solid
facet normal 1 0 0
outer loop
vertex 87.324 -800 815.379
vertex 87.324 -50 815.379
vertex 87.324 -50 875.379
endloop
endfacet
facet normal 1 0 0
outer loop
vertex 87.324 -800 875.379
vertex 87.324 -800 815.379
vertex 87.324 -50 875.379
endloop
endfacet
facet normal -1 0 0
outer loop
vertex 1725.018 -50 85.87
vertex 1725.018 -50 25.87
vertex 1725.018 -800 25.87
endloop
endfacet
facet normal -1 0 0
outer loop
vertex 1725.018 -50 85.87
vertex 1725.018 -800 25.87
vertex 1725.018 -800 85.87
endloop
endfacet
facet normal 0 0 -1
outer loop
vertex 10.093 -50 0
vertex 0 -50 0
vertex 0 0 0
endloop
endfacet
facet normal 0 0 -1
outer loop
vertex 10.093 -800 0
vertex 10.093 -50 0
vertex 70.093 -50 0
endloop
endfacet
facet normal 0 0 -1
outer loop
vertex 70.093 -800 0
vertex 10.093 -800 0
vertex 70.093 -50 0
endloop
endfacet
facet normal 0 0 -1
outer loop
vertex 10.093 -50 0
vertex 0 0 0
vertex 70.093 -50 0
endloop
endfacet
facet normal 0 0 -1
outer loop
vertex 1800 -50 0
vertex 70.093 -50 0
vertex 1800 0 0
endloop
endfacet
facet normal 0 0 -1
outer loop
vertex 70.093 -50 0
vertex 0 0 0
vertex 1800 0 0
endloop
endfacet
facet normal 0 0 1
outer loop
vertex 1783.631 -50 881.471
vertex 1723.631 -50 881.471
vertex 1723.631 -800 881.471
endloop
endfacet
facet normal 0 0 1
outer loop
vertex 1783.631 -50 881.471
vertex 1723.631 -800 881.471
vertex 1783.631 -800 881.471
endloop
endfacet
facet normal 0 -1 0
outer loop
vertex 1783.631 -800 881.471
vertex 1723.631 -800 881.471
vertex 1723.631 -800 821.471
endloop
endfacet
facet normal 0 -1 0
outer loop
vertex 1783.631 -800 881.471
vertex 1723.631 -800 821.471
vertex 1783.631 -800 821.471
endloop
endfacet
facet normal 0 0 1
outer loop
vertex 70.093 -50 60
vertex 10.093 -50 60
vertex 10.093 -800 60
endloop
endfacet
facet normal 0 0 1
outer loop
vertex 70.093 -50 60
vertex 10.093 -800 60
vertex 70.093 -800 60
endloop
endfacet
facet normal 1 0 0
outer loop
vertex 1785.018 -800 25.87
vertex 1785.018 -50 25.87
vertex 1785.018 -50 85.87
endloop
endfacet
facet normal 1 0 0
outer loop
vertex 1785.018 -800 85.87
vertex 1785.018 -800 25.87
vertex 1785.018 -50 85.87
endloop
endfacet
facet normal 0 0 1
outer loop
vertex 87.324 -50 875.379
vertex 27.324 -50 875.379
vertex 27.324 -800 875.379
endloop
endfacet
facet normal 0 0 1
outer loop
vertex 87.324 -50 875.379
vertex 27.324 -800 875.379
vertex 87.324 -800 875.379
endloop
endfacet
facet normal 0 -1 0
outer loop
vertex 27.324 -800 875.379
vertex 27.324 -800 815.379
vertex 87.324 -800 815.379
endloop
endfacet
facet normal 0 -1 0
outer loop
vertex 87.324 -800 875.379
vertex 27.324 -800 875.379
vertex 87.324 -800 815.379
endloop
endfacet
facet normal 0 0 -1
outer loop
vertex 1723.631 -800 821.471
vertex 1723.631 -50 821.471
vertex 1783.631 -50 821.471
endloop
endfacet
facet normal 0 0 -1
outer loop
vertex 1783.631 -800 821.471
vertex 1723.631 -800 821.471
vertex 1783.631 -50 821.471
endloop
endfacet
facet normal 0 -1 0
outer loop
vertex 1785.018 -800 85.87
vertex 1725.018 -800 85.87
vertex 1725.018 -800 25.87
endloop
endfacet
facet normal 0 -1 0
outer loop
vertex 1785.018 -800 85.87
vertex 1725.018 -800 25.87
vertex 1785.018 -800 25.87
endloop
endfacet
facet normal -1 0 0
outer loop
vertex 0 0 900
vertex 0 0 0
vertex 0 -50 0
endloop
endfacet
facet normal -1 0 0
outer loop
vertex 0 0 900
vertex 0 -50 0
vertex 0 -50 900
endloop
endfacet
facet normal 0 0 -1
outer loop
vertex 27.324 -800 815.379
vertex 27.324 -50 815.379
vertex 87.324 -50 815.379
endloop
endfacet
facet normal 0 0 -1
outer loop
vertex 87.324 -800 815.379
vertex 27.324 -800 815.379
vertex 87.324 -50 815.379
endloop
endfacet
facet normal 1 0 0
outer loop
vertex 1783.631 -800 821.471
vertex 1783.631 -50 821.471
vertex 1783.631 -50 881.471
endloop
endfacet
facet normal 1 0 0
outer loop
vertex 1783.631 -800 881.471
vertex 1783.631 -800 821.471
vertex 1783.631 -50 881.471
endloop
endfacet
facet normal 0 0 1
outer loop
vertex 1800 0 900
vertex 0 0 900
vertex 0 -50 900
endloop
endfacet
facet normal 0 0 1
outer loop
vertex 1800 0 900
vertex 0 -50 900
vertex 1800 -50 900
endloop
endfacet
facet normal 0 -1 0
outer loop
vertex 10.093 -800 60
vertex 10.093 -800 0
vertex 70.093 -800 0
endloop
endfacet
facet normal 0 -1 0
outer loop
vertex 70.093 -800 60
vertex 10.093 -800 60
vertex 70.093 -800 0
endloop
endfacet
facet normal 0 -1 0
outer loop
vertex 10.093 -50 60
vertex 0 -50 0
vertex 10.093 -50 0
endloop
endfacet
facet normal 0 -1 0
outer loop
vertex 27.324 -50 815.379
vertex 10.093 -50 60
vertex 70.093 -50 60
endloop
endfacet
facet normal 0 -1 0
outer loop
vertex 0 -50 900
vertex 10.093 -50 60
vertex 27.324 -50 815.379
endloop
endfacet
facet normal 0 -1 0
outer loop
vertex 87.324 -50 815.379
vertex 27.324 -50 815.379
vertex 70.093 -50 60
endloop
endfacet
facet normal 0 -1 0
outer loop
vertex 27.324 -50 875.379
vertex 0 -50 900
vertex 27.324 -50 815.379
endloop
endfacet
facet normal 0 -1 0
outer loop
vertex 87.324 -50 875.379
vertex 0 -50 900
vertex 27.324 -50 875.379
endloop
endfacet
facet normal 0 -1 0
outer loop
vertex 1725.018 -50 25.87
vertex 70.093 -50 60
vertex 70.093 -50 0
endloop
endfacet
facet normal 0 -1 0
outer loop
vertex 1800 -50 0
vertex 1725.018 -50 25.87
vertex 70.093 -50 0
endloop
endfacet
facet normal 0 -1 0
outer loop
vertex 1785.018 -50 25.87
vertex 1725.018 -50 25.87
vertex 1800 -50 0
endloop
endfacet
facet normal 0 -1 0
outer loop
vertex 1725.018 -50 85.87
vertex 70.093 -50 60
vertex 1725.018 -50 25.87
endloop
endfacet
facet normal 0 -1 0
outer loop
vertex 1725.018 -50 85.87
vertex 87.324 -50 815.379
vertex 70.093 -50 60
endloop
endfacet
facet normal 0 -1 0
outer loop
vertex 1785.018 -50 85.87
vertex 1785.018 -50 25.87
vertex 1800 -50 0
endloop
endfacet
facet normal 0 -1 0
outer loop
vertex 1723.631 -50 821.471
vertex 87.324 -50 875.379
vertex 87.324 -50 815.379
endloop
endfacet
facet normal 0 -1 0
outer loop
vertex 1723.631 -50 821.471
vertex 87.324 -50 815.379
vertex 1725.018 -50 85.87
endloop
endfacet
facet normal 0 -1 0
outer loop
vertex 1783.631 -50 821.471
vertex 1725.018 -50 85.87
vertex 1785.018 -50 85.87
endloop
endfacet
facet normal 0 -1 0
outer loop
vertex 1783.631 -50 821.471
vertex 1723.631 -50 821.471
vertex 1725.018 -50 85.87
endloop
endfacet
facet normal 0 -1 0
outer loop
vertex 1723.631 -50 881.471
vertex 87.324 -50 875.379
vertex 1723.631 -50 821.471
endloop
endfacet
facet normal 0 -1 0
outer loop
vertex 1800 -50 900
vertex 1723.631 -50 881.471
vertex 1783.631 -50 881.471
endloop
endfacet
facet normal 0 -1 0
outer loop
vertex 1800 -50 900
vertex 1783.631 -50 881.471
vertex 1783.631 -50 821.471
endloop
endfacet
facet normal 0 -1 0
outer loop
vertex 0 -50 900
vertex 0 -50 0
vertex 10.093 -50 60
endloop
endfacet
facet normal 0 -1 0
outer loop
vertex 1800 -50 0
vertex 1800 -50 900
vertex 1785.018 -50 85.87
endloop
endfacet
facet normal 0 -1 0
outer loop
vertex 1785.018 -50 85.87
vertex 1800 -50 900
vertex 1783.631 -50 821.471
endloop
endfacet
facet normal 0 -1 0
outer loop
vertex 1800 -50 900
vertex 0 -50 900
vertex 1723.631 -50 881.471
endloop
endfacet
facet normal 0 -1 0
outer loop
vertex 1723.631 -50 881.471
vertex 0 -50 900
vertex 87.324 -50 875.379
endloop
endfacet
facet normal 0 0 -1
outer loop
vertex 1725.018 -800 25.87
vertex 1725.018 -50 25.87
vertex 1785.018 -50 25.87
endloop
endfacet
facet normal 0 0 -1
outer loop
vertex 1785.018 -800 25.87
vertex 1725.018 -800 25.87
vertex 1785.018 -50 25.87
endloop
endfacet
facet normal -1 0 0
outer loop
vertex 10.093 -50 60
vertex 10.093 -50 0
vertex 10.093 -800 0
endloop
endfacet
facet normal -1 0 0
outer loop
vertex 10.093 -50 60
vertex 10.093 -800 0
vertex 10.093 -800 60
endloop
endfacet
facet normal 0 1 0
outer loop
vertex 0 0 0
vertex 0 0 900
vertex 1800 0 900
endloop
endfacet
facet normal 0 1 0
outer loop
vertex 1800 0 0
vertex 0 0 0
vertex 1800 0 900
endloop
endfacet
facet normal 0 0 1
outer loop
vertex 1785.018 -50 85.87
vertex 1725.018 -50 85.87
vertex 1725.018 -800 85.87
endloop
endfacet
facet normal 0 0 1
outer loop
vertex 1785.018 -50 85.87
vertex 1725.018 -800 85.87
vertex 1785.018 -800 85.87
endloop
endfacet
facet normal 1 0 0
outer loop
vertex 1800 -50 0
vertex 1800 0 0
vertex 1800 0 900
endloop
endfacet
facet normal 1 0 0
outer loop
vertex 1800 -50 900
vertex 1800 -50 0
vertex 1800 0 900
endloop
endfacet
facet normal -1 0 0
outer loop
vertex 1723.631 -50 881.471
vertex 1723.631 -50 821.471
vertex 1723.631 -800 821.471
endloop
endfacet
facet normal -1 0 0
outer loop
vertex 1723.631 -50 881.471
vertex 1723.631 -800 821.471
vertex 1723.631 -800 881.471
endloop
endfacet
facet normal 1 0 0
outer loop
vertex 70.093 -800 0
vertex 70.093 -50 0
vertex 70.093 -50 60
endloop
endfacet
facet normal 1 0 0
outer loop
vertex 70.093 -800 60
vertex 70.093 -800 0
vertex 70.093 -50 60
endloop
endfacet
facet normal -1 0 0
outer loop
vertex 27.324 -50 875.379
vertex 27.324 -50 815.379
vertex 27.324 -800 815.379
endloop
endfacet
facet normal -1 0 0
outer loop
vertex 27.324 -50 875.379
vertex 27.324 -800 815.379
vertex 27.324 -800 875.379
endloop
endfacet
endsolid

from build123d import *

# Parameters (mm, degrees)
SKETCH_W     = 1800
SKETCH_H     = 900
PAD_DEPTH    = 50
SKETCH001_W  = 60
SKETCH001_H  = 60
PAD001_DEPTH = 750


with BuildPart() as part:
    # Sketch → Pad (new body)
    with BuildSketch(Plane.XZ):
        with Locations((900, 450)):
            Rectangle(SKETCH_W, SKETCH_H)
    extrude(amount=PAD_DEPTH)

    # Sketch001 (on Face6 of Pad) → Pad001 (join)
    with BuildSketch(Plane.XZ.offset(50)):
        with Locations((1755.017945, 55.870171)):
            Rectangle(SKETCH001_W, SKETCH001_H)
        with Locations((1753.631055, 851.470837)):
            Rectangle(SKETCH001_W, SKETCH001_H)
        with Locations((40.092932, 30)):
            Rectangle(SKETCH001_W, SKETCH001_H)
        with Locations((57.324378, 845.378981)):
            Rectangle(SKETCH001_W, SKETCH001_H)
    extrude(amount=PAD001_DEPTH)


solid = part.part
